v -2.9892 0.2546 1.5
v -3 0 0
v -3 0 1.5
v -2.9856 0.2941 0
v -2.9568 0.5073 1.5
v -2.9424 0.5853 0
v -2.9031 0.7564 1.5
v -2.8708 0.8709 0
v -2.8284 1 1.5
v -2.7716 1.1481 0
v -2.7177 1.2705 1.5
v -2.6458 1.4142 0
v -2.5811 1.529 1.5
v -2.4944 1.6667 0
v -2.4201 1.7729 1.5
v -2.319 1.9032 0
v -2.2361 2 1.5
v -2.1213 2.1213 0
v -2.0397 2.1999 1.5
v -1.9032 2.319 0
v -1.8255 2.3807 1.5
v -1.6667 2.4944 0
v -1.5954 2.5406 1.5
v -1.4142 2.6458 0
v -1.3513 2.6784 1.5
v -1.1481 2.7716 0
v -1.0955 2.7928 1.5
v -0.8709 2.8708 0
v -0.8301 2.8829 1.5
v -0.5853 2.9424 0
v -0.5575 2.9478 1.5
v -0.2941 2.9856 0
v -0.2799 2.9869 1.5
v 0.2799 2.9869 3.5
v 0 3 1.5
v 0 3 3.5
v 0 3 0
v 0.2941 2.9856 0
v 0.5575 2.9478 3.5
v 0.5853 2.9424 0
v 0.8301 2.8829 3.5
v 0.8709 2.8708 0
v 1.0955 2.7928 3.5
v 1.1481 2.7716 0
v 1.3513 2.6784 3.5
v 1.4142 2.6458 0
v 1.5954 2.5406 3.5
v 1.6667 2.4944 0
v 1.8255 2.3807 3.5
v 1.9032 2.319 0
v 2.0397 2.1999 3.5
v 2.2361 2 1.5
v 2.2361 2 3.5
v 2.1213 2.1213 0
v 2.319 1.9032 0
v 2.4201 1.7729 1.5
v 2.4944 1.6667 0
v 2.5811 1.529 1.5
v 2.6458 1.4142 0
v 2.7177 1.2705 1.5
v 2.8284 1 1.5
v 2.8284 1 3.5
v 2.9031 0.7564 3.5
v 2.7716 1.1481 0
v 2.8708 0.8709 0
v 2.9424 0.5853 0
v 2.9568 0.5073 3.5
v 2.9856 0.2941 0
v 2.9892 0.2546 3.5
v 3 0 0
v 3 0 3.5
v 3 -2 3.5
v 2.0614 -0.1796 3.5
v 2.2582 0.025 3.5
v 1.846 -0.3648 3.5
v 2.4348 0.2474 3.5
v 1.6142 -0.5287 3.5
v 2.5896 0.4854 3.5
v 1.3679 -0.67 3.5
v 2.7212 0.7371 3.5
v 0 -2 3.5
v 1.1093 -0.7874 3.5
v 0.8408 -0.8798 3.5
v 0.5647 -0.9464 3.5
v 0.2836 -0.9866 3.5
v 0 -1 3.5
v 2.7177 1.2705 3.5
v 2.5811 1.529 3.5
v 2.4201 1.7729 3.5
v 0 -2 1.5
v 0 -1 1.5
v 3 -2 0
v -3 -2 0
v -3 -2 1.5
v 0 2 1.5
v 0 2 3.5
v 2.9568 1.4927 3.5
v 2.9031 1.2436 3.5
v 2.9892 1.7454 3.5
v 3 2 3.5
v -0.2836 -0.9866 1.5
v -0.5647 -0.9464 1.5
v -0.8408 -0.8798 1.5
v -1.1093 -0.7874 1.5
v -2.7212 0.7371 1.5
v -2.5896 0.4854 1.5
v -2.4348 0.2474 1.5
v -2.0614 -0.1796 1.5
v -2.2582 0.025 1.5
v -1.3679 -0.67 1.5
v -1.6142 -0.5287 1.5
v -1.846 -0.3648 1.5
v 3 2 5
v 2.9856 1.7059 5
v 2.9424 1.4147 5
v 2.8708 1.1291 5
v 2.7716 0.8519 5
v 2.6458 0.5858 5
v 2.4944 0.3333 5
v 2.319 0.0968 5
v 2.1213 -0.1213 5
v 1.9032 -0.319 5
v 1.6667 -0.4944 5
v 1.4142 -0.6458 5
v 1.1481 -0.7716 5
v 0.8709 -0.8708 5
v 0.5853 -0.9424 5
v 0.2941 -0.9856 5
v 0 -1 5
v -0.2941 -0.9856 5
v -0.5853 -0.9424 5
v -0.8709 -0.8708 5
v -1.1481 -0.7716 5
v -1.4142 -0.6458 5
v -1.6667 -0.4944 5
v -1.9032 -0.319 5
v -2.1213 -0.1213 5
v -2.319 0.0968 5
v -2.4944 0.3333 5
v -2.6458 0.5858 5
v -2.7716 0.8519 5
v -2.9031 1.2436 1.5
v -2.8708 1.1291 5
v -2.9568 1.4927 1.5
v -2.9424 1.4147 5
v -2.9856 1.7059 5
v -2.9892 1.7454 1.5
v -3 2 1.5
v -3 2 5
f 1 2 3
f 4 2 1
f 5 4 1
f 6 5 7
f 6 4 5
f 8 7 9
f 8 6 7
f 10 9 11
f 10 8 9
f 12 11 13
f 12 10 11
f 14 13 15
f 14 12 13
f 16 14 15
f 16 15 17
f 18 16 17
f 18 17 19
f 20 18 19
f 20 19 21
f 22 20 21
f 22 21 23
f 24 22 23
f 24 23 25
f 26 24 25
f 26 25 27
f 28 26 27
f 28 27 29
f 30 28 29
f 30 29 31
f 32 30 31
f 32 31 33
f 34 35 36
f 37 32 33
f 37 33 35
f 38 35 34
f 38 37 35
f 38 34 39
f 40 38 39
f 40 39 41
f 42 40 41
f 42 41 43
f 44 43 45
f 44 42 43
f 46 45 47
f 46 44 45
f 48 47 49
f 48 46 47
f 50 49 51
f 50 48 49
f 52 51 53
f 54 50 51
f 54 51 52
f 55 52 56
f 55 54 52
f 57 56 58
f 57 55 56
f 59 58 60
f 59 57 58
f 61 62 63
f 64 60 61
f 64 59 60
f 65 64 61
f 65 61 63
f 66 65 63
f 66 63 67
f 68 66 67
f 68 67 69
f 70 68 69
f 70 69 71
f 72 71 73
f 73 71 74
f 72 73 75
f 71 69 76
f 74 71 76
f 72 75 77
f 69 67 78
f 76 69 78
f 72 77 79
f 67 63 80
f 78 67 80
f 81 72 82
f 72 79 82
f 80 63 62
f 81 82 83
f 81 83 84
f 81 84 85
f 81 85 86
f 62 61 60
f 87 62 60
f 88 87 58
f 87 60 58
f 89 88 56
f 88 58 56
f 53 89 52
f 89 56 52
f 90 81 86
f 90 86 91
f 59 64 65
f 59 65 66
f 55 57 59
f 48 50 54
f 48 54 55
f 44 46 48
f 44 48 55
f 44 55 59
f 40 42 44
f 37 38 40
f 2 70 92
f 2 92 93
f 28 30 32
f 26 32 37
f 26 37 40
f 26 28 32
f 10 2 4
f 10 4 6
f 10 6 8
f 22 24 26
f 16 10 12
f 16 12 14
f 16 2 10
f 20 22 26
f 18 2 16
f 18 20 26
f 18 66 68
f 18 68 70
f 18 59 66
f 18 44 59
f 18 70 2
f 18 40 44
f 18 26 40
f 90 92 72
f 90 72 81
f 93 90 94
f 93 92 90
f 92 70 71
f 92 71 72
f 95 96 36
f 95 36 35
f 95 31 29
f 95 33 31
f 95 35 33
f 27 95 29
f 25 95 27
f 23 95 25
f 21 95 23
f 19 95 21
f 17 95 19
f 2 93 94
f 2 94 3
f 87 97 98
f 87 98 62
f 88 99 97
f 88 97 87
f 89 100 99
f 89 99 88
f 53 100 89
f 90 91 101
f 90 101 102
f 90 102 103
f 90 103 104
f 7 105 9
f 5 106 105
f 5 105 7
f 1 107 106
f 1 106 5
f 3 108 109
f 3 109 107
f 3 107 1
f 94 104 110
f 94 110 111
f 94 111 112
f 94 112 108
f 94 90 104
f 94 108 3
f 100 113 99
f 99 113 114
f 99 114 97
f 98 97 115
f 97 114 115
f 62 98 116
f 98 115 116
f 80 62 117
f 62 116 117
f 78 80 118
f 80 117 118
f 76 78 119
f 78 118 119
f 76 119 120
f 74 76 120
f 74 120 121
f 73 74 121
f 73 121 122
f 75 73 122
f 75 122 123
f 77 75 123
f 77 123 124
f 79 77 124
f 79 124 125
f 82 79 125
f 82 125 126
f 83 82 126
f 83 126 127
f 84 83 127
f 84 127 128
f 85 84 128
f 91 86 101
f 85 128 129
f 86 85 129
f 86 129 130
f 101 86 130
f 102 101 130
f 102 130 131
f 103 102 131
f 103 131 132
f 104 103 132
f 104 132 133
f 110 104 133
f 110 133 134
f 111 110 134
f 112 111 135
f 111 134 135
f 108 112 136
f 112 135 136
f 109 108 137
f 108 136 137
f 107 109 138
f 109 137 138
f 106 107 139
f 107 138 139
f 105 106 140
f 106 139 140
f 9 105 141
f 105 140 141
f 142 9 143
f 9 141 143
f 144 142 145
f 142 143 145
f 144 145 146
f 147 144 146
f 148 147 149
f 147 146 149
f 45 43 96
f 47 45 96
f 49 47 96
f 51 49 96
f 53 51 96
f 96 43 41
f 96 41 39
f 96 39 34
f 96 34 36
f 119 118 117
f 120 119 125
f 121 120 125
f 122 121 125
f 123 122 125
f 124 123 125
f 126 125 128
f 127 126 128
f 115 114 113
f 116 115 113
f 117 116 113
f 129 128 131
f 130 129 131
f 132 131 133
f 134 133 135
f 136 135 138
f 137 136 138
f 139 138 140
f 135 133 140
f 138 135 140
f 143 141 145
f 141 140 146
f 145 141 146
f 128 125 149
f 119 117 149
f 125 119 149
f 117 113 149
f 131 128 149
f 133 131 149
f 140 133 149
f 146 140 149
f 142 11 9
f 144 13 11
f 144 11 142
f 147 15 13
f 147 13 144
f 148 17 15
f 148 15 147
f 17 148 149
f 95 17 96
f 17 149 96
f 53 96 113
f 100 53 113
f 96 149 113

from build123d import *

# Parameters (mm, degrees)
BOSS_EXTRUDE7_DEPTH      = 3.5
SKETCH12_W               = 3
SKETCH12_H               = 2
CUT_EXTRUDE5_DEPTH       = 5.5
BOSS_EXTRUDE8_DEPTH      = 1.5
BOSS_EXTRUDE8_DEPTH_BACK = 2
CUT_EXTRUDE6_DEPTH       = 2


with BuildPart() as part:
    # Sketch11 → Boss-Extrude7 (new body)
    with BuildSketch(Plane.XY):
        with BuildLine():
            Line((3, 0), (3, -2))
            Line((3, -2), (-3, -2))
            Line((-3, -2), (-3, 0))
            ThreePointArc((-3, 0), (0, 3), (3, 0))
        make_face()
    extrude(amount=BOSS_EXTRUDE7_DEPTH)

    # Sketch12 → Cut-Extrude5 (cut)
    with BuildSketch(Plane(origin=(0, -2, 0), x_dir=(-1, 0, 0), z_dir=(0, -1, 0))):
        with Locations((1.5, -2.5)):
            Rectangle(SKETCH12_W, SKETCH12_H)
    extrude(amount=-CUT_EXTRUDE5_DEPTH, mode=Mode.SUBTRACT)

    # Sketch13 → Boss-Extrude8 (add, two sides)
    with BuildSketch(Plane.XY.offset(3.5)) as boss_extrude8_sk:
        with BuildLine():
            Line((-3, 2), (3, 2))
            ThreePointArc((3, 2), (0, -1), (-3, 2))
        make_face()
    extrude(amount=BOSS_EXTRUDE8_DEPTH)
    extrude(boss_extrude8_sk.sketch, amount=-BOSS_EXTRUDE8_DEPTH_BACK)

    # Sketch14 → Cut-Extrude6 (cut)
    with BuildSketch(Plane(origin=(0, 0, 1.5), x_dir=(-1, 0, 0), z_dir=(0, 0, -1))):
        with BuildLine():
            ThreePointArc((-3, 2), (-2.956795679, 1.492694064), (-2.828427125, 1))
            ThreePointArc((-2.828427125, 1), (-2.58113883, 1.528961196), (-2.236067977, 2))
            Line((-2.236067977, 2), (-3, 2))
        make_face()
    extrude(amount=-CUT_EXTRUDE6_DEPTH, mode=Mode.SUBTRACT)


solid = part.part
